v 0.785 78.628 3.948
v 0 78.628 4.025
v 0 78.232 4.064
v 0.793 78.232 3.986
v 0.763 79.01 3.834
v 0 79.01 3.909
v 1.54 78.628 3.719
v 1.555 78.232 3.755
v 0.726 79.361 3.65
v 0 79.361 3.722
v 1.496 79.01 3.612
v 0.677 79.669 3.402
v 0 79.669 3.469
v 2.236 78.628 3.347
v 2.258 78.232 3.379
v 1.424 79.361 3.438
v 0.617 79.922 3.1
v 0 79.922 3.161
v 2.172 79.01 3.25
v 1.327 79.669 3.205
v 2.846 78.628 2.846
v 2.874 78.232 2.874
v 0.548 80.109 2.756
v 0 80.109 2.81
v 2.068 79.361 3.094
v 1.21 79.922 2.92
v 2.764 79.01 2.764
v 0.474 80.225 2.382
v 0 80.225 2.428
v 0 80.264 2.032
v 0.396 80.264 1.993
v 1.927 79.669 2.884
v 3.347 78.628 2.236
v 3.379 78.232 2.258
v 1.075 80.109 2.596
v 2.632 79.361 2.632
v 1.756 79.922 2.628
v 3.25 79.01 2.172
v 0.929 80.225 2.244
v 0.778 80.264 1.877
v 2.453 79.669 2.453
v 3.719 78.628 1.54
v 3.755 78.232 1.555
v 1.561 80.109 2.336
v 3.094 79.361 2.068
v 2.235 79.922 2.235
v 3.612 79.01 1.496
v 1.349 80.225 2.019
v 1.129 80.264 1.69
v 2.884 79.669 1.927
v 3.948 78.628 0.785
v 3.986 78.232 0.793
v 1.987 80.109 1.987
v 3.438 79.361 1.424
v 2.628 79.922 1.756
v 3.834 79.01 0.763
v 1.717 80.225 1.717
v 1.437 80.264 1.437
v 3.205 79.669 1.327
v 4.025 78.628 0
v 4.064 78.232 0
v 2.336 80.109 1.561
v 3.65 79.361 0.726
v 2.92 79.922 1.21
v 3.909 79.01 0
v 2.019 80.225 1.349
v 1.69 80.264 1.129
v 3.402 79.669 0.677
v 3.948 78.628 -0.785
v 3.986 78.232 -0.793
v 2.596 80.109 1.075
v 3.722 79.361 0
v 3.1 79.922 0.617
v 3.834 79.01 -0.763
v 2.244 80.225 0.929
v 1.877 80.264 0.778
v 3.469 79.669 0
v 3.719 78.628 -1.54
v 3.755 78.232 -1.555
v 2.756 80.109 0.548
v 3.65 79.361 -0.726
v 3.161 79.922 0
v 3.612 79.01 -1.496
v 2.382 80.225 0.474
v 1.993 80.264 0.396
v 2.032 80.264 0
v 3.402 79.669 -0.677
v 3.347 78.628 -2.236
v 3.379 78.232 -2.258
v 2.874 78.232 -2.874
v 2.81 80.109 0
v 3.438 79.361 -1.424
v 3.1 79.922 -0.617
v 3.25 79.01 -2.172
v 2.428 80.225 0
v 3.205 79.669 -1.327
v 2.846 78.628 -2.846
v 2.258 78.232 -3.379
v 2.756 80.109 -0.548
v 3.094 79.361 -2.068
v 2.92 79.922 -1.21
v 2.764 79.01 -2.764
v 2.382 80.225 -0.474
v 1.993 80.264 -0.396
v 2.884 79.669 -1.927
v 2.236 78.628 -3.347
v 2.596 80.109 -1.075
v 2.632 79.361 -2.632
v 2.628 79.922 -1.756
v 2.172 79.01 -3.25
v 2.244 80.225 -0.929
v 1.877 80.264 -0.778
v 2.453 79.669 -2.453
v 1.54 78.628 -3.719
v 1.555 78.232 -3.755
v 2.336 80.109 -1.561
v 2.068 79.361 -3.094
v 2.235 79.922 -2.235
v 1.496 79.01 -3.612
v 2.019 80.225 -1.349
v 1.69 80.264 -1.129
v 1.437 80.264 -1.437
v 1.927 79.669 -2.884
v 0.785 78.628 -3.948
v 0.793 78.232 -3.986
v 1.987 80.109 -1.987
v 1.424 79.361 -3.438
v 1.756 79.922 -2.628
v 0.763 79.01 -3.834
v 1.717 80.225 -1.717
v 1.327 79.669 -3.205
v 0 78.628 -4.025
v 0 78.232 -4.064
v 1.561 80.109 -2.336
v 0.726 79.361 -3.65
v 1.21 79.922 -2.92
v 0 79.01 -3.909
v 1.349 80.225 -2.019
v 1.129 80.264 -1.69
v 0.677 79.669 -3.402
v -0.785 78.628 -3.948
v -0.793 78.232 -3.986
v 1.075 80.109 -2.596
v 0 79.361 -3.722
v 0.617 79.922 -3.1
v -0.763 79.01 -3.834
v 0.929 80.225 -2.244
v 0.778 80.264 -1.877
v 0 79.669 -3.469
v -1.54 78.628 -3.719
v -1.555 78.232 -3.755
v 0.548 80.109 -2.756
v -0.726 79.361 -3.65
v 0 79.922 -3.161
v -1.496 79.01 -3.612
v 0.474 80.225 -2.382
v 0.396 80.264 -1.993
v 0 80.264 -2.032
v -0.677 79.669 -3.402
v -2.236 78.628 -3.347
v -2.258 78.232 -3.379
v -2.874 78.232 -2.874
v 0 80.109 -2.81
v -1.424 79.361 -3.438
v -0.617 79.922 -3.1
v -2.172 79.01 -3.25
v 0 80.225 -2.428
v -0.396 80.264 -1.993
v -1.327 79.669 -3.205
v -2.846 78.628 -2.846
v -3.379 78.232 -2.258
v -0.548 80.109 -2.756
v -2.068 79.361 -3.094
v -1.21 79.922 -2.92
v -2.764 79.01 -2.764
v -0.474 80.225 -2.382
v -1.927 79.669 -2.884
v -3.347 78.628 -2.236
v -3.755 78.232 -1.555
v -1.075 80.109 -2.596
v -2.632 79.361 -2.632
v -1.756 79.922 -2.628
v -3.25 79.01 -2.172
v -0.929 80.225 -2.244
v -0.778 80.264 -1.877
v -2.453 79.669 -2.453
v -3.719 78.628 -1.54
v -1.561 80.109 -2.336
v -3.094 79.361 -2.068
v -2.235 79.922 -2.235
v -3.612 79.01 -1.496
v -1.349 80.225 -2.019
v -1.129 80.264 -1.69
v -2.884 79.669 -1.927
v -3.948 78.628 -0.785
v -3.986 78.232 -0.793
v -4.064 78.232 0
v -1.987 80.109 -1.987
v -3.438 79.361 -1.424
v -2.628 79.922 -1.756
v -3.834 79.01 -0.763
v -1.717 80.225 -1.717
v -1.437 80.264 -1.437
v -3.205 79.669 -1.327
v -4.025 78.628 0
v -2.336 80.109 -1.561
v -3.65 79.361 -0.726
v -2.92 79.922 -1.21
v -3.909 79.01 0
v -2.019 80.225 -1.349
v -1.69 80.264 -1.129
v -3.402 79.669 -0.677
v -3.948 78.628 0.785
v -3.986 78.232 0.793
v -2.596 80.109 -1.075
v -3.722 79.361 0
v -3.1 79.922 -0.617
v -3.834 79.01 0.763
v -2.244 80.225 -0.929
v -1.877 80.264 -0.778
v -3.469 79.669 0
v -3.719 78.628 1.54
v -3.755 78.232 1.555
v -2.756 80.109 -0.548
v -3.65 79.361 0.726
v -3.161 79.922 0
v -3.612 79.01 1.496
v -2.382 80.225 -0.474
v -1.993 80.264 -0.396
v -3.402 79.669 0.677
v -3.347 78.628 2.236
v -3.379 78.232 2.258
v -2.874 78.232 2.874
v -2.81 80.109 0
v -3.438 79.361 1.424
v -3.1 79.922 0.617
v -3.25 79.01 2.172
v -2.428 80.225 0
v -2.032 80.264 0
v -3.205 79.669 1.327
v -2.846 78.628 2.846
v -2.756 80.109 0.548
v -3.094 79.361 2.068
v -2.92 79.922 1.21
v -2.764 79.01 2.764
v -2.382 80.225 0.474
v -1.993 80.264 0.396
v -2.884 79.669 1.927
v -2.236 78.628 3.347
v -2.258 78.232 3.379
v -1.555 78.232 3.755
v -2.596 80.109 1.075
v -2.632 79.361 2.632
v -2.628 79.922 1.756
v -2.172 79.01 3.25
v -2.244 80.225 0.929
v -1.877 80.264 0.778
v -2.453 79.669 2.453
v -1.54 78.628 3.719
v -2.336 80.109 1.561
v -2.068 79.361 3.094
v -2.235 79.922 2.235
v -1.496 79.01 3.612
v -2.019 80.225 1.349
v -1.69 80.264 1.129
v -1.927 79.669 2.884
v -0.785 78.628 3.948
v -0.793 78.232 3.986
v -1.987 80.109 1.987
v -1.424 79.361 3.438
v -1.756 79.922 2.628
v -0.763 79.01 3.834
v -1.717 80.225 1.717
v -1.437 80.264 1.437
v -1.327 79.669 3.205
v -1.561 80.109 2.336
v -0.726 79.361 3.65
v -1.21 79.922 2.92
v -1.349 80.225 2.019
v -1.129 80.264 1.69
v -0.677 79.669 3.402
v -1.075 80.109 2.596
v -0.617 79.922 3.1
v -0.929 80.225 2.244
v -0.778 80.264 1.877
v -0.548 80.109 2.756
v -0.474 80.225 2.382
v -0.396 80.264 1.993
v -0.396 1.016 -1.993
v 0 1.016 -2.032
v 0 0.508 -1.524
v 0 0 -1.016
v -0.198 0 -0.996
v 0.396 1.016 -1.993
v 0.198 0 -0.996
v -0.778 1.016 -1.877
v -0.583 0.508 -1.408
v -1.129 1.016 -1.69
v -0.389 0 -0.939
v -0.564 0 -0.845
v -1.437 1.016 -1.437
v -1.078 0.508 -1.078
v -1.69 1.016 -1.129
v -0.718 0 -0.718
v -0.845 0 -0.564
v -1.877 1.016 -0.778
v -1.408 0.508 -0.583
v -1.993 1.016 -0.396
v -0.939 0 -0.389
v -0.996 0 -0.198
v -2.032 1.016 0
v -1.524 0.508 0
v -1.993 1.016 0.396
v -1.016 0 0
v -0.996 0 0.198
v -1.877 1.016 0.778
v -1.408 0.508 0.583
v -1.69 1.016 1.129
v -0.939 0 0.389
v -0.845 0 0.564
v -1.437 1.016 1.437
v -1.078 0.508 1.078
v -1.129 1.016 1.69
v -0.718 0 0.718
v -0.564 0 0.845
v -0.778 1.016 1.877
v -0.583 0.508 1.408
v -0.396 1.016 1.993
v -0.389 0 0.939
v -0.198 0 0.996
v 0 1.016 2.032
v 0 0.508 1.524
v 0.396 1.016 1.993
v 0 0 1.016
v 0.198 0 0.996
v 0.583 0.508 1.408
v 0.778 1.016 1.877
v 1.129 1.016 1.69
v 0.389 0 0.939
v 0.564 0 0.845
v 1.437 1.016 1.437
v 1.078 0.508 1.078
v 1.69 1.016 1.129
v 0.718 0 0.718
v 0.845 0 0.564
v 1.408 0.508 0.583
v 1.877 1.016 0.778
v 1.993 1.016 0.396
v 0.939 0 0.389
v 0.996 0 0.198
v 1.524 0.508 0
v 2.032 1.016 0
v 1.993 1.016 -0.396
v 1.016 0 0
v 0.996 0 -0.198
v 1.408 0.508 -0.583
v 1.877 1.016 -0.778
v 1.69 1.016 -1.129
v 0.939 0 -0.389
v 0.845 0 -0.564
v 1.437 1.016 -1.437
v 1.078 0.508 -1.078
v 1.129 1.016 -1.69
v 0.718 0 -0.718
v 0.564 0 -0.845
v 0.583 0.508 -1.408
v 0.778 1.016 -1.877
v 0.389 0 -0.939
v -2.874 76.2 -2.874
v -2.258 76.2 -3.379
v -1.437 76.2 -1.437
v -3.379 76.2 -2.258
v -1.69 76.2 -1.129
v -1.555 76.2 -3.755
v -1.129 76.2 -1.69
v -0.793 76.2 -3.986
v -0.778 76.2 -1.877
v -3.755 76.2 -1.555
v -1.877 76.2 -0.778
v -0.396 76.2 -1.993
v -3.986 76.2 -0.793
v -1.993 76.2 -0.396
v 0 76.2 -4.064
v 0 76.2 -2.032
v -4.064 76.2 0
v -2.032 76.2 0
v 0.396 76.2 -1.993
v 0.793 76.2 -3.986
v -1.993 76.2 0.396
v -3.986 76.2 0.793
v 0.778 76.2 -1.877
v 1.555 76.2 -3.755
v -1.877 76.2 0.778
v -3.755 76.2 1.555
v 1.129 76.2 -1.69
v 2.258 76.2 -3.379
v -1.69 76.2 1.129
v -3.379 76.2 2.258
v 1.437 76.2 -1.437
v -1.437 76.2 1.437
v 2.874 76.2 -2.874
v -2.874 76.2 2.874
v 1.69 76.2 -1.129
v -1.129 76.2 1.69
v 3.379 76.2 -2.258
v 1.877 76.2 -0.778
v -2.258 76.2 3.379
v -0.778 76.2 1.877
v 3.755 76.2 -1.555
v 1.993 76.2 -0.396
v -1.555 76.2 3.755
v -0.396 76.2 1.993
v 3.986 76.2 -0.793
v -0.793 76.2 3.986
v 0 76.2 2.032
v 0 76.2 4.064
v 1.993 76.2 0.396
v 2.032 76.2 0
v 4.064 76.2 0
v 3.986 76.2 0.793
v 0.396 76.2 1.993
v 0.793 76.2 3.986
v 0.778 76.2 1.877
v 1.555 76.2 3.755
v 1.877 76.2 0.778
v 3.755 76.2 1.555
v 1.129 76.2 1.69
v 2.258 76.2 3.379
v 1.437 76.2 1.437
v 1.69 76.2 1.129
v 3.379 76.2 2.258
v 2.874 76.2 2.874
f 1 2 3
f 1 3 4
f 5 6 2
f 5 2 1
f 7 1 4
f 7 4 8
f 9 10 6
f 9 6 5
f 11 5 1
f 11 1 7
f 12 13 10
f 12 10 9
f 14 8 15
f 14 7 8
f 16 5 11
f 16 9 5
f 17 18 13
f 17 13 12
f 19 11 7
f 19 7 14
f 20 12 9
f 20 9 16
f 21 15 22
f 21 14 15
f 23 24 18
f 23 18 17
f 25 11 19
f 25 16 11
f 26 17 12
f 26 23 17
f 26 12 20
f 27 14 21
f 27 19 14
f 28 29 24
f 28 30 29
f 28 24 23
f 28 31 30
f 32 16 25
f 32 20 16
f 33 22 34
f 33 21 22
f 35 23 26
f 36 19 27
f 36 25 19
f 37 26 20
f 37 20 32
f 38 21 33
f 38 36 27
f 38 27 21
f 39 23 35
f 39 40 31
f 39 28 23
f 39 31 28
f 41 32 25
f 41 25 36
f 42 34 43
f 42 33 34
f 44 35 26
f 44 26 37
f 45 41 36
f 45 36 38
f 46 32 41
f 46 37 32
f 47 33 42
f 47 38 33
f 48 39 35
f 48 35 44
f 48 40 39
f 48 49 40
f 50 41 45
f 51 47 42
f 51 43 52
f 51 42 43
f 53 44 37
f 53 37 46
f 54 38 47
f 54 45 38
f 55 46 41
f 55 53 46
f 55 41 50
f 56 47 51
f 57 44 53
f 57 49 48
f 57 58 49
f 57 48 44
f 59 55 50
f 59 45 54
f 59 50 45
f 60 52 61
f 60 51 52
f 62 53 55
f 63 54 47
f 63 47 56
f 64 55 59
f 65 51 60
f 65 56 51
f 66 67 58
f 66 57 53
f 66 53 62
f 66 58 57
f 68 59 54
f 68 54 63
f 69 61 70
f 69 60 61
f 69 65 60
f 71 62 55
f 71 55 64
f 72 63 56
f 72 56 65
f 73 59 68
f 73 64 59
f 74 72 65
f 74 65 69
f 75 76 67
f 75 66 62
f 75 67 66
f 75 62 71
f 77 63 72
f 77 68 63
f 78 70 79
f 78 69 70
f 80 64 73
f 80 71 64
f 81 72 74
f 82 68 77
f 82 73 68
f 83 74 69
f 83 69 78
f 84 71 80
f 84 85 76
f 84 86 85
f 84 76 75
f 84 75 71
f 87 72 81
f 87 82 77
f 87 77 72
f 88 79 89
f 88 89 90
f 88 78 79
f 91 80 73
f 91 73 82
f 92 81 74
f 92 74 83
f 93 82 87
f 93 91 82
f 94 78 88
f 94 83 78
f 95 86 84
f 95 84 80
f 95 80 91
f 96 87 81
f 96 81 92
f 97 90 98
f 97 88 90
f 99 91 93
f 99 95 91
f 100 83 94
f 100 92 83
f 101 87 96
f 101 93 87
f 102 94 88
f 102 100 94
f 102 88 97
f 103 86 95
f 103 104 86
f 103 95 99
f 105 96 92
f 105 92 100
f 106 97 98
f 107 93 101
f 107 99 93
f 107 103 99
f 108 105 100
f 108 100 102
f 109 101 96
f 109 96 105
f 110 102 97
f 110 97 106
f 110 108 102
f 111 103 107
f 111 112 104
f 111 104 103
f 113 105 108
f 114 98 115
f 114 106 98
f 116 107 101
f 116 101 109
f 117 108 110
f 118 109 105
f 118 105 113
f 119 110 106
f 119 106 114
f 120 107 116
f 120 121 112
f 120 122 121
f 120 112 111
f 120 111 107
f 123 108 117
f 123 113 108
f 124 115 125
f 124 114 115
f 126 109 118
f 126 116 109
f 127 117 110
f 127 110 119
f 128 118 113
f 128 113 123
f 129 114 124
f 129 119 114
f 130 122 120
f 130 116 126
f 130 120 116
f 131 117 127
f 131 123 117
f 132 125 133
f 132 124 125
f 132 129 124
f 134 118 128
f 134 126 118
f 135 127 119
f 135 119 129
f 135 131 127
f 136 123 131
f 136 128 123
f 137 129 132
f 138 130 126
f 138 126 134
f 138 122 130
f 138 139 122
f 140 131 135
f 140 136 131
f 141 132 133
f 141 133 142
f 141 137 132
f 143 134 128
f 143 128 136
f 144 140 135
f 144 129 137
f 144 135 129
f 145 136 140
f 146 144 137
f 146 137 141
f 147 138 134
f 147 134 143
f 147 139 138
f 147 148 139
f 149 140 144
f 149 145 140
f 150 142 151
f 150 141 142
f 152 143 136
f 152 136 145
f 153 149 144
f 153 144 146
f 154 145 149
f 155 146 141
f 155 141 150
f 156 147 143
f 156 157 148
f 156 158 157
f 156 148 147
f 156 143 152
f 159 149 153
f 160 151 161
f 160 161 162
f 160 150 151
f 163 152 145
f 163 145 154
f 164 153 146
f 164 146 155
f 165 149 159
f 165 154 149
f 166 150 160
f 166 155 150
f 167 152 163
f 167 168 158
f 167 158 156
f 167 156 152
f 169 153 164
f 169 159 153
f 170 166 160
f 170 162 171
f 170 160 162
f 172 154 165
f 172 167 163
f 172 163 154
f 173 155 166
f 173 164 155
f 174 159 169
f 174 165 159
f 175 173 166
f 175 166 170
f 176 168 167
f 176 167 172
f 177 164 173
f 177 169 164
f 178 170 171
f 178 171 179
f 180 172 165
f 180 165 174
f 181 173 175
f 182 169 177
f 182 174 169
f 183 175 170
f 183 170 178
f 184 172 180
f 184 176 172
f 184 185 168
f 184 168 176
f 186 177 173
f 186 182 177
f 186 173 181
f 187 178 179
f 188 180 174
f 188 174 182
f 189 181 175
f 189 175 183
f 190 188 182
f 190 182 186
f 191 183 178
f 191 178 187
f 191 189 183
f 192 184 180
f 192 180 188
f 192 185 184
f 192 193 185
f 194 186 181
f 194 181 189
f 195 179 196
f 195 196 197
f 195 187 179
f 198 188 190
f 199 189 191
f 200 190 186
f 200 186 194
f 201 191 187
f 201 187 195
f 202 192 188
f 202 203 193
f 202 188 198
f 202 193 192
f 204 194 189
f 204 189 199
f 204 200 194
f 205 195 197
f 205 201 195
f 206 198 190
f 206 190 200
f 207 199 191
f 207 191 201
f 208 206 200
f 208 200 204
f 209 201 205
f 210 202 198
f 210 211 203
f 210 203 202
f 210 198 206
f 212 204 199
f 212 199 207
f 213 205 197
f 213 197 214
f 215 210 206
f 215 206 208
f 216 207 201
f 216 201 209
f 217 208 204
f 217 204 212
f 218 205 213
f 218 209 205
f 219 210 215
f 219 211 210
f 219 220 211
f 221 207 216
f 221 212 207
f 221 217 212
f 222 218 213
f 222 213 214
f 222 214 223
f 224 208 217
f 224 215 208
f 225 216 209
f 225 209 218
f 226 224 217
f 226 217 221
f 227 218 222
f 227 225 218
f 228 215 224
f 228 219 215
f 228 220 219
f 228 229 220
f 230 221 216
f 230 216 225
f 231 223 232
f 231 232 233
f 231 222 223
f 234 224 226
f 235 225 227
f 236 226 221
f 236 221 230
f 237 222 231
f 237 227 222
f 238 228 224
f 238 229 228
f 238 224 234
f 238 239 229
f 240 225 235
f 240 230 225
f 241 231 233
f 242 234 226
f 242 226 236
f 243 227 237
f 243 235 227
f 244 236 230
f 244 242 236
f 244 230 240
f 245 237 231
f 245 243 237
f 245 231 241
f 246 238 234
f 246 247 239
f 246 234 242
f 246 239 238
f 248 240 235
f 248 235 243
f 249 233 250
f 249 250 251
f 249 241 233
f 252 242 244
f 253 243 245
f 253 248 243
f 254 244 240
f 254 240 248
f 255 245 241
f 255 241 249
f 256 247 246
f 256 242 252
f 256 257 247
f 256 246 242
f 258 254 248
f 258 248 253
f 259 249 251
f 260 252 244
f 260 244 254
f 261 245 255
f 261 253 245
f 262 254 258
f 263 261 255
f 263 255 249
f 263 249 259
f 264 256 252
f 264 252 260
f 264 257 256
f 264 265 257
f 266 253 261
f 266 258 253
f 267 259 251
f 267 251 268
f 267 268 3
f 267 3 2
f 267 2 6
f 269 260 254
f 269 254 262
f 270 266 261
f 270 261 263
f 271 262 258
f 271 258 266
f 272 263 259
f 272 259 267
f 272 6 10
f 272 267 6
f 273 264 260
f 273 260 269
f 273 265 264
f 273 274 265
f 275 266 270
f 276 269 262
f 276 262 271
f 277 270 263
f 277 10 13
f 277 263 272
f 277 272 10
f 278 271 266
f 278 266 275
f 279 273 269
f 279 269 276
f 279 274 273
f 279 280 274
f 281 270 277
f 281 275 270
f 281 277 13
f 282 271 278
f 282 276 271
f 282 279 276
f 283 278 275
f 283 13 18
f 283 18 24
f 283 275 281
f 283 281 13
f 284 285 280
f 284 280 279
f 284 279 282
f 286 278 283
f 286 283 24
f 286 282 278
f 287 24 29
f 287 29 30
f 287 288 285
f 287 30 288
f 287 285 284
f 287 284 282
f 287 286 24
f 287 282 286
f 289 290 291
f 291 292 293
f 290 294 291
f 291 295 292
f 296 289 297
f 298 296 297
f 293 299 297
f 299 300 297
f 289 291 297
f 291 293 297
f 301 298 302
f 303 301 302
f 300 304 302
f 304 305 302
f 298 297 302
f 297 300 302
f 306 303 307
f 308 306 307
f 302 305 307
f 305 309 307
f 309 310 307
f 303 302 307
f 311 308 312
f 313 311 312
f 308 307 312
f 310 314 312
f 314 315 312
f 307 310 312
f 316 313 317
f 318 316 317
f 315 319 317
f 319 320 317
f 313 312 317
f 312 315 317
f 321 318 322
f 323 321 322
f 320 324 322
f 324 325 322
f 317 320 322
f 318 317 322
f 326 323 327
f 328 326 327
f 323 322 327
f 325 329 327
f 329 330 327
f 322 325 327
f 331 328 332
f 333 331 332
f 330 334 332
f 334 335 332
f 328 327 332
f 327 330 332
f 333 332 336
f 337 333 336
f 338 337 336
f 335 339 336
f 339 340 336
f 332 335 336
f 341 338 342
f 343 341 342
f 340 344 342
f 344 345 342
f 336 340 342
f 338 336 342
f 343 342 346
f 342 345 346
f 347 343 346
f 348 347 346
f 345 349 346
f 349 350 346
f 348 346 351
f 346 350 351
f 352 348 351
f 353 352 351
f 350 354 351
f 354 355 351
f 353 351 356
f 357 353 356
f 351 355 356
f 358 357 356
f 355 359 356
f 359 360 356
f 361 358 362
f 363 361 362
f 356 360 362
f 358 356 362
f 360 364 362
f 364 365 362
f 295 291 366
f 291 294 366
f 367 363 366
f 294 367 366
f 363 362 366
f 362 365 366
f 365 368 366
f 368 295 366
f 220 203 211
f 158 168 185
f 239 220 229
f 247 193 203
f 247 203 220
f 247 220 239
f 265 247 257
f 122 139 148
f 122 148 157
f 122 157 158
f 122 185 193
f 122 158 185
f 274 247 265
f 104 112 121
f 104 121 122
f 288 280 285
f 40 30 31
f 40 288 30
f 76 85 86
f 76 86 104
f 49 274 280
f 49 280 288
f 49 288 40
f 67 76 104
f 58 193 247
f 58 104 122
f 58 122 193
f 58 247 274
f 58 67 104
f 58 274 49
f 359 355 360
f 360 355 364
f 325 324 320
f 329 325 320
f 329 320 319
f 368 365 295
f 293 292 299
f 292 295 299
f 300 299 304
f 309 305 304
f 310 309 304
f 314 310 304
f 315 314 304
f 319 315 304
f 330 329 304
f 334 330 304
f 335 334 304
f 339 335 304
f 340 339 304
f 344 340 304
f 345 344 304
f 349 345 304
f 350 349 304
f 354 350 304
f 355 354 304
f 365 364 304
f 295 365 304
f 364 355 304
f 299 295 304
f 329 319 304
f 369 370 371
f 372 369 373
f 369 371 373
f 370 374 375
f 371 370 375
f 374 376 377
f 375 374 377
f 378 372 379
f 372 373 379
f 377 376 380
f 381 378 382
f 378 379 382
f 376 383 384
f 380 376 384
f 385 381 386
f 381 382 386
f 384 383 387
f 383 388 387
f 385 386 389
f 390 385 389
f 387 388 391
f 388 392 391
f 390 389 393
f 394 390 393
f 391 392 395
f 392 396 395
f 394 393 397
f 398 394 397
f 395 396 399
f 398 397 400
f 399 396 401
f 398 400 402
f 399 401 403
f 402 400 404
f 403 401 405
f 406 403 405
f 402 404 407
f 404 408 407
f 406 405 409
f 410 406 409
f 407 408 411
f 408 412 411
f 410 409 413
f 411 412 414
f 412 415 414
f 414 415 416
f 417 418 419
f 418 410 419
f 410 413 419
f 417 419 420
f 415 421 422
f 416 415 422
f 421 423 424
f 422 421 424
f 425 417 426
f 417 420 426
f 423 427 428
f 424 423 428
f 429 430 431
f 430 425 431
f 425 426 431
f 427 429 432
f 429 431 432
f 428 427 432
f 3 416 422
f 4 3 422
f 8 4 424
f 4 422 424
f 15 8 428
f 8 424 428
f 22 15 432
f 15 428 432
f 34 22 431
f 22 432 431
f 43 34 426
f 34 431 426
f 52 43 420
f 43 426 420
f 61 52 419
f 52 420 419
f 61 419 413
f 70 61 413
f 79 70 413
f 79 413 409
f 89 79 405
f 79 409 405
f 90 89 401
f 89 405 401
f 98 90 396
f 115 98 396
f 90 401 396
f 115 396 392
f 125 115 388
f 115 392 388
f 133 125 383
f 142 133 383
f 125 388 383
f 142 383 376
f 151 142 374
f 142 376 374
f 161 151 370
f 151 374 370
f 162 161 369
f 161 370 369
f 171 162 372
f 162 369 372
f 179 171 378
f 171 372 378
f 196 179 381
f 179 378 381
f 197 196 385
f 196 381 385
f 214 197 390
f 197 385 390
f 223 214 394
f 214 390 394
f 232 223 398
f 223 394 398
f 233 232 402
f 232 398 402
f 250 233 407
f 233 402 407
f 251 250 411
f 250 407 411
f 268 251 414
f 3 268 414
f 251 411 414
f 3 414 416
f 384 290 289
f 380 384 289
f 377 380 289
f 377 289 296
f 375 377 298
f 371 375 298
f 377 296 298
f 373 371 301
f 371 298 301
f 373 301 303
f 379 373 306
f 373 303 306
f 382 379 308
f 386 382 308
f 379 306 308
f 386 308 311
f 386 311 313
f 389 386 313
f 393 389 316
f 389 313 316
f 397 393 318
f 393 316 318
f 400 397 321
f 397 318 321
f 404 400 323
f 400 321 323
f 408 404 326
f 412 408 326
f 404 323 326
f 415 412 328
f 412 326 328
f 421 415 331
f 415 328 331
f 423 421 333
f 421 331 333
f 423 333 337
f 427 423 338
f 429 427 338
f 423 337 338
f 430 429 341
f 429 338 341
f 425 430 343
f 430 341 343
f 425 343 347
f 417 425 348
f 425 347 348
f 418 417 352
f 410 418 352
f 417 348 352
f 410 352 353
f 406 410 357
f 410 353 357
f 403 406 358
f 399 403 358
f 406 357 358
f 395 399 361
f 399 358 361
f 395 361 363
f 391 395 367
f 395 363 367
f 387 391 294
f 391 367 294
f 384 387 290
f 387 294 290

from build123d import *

# Parameters (mm, degrees)
SKETCH1_R           = 2.032
BOSS_EXTRUDE1_DEPTH = 76.2
SKETCH2_R           = 4.064
BOSS_EXTRUDE2_DEPTH = 4.064
FILLET1_R           = 2.032
CHAMFER1_SIZE       = 1.016


with BuildPart() as part:
    # Sketch1 → Boss-Extrude1 (new body)
    with BuildSketch(Plane(origin=(0, 0, 0), x_dir=(1, 0, 0), z_dir=(0, 1, 0))):
        with Locations(Location((0, 0, 0), (0, 0, 90))):
            Circle(SKETCH1_R)
    extrude(amount=BOSS_EXTRUDE1_DEPTH)

    # Sketch2 → Boss-Extrude2 (add)
    with BuildSketch(Plane(origin=(0, 76.2, 0), x_dir=(1, 0, 0), z_dir=(0, 1, 0))):
        with Locations(Location((0, 0, 0), (0, 0, 270))):
            Circle(SKETCH2_R)
    extrude(amount=BOSS_EXTRUDE2_DEPTH)

    # Fillet1
    fillet1_edges = [part.edges().sort_by_distance(p)[0] for p in [
        (0, 80.264, -4.064),
    ]]
    fillet(fillet1_edges, radius=FILLET1_R)

    # Chamfer1
    chamfer1_edges = [part.edges().sort_by_distance(p)[0] for p in [
        (0, 0, 2.032),
    ]]
    chamfer(chamfer1_edges, length=CHAMFER1_SIZE)


solid = part.part
